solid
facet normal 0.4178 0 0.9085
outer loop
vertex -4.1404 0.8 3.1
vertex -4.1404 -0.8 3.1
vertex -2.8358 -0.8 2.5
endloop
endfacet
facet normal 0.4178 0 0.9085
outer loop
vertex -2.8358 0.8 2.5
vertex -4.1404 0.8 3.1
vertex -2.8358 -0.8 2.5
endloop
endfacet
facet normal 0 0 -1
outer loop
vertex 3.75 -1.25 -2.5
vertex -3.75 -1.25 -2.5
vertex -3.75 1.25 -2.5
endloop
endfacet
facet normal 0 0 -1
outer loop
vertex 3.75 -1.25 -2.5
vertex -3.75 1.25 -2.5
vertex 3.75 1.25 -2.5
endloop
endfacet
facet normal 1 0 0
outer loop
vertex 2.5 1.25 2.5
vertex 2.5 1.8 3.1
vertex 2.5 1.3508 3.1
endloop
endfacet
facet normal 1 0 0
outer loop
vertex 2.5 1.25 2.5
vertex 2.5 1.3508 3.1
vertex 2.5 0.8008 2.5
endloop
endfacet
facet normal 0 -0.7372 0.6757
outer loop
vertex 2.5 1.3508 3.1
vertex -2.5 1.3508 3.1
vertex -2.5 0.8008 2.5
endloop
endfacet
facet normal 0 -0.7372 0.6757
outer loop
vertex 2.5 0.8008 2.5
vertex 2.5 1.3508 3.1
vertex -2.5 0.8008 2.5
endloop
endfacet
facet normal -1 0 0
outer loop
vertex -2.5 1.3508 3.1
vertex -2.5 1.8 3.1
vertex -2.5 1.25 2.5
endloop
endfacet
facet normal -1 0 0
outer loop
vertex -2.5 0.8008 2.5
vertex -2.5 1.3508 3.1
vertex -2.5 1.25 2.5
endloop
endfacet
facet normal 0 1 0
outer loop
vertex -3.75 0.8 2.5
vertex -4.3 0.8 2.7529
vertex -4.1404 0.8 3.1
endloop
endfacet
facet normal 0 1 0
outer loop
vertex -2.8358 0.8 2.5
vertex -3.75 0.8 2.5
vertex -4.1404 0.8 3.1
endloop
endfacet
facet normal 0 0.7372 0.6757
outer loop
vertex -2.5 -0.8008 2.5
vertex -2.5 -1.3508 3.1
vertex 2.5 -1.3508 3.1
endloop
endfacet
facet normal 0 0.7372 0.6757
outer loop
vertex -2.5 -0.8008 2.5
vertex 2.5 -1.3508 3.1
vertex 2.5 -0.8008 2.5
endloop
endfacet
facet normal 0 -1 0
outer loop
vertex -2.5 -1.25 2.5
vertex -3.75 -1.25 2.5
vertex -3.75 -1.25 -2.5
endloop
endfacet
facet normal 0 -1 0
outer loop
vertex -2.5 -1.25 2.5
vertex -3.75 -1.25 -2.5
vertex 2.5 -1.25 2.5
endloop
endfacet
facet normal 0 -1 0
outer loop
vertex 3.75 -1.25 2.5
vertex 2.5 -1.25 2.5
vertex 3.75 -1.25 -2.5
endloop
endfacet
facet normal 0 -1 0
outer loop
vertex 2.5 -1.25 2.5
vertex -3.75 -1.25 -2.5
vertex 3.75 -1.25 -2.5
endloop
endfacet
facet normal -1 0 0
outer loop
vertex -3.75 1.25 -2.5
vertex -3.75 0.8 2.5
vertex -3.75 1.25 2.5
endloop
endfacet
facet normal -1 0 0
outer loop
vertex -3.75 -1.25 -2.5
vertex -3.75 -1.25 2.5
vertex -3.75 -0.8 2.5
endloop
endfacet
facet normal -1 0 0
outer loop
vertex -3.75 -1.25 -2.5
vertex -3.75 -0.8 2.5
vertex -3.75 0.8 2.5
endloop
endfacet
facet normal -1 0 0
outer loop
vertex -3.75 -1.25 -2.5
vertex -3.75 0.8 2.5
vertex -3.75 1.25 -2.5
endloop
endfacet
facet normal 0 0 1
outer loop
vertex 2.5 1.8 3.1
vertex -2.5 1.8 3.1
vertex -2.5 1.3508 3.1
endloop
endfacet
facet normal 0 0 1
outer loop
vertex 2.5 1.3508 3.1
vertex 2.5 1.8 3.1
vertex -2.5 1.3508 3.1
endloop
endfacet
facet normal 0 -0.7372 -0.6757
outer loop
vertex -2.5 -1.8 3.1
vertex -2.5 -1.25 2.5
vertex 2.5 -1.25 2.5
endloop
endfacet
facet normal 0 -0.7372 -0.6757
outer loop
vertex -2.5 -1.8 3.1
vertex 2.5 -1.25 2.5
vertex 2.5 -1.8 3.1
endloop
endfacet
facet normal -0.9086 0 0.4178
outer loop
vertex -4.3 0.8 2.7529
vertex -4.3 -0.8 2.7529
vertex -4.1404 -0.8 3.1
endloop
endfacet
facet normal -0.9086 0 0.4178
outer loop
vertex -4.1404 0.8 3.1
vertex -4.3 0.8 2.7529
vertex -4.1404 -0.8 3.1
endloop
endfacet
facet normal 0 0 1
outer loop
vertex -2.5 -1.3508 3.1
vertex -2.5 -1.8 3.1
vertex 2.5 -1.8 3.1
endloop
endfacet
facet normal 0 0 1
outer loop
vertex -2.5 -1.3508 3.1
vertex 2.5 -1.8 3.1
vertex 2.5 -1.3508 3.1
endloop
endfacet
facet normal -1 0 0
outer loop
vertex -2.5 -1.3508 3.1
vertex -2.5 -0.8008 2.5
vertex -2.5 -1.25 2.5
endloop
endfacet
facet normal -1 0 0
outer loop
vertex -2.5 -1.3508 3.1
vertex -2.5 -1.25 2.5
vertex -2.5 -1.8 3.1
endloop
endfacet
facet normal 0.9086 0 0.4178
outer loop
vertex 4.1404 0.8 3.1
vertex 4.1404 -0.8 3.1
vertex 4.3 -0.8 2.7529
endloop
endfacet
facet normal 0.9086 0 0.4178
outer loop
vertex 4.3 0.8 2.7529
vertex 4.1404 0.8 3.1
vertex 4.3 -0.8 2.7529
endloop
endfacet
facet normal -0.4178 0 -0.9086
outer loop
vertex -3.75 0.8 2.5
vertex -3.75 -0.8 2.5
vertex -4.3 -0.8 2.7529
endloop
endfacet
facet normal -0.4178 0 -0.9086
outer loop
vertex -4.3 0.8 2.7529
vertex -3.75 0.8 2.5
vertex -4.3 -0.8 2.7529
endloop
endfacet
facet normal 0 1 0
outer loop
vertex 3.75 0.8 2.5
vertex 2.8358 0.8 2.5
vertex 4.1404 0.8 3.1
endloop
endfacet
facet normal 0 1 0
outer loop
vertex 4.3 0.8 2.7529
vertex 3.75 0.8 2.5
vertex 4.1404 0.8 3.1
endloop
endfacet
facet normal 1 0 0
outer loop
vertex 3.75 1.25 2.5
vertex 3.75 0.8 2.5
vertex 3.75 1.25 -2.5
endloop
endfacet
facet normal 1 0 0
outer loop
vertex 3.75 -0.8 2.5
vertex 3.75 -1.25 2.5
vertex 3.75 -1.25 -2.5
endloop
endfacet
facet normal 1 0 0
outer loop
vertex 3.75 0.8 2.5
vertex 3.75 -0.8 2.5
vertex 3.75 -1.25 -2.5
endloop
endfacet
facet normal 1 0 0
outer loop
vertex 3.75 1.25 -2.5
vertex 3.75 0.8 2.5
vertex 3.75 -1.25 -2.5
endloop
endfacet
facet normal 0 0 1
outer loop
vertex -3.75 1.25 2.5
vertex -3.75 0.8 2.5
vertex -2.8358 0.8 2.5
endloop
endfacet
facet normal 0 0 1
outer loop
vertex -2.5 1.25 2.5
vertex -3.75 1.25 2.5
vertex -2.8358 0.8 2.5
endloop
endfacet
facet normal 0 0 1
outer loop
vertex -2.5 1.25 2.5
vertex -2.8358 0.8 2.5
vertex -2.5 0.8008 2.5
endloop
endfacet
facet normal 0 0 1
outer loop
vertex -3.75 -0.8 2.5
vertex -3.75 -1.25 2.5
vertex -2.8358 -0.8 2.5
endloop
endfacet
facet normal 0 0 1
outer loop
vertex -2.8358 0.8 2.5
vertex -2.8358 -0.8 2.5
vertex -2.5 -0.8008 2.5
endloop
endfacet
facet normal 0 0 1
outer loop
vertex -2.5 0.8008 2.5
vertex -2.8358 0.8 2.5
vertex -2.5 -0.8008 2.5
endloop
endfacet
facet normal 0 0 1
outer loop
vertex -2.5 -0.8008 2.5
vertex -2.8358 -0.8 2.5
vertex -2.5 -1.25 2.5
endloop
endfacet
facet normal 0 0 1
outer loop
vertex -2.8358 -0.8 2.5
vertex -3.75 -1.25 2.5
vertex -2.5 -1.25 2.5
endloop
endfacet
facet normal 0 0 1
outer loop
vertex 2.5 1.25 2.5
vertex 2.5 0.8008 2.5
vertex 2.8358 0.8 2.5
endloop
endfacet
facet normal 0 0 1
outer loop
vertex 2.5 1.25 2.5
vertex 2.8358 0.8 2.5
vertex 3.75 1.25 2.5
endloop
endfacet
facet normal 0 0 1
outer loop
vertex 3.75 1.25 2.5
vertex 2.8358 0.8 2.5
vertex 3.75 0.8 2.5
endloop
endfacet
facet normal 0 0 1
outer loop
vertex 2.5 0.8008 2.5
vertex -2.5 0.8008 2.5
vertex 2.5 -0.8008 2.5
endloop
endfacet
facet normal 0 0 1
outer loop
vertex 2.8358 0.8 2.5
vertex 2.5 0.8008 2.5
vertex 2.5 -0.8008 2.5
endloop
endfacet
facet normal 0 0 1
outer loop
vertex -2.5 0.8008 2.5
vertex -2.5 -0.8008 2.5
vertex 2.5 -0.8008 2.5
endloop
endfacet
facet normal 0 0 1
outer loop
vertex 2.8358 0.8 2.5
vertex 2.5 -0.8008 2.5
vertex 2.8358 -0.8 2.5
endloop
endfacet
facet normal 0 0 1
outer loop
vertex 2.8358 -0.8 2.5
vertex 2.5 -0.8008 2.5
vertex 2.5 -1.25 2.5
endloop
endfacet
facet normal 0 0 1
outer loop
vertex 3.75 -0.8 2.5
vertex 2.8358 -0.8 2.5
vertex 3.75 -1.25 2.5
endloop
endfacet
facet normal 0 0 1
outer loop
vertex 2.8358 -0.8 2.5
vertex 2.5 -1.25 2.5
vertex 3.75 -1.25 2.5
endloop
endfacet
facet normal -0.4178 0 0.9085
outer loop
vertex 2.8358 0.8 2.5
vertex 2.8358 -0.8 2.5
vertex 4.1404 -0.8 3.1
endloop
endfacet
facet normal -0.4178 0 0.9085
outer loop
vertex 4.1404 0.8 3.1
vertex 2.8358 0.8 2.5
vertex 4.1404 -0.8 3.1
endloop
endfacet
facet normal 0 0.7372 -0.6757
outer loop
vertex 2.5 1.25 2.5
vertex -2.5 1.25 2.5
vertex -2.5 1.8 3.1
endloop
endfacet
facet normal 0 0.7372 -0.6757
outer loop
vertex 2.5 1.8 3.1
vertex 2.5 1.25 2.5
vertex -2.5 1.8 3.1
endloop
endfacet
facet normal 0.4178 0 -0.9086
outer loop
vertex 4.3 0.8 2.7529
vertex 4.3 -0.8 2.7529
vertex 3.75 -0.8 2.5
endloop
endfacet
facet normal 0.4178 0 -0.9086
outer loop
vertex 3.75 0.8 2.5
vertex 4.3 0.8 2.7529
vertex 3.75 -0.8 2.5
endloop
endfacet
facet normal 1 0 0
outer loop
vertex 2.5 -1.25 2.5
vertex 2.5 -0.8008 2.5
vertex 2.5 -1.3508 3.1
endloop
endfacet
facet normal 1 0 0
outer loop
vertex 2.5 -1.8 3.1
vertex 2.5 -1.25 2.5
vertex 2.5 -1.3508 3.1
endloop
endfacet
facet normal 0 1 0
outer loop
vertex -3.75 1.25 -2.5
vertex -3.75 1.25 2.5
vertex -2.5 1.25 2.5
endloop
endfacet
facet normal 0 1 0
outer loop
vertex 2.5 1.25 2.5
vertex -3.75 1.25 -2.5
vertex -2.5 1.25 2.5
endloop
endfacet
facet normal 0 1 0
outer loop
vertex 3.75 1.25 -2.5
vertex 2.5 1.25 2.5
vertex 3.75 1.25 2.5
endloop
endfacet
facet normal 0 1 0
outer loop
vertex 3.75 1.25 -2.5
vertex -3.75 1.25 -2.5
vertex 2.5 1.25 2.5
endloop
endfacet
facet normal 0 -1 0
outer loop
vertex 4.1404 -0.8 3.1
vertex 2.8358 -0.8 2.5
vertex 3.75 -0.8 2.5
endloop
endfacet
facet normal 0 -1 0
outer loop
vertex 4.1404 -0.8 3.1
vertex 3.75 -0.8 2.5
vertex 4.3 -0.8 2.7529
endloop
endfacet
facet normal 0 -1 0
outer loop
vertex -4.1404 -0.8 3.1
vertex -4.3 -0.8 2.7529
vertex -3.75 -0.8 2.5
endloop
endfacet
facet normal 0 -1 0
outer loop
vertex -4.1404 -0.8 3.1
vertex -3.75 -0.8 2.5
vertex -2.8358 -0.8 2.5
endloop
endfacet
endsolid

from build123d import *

# Parameters (mm, degrees)
BOSS_EXTRUDE1_DEPTH      = 1.25
BOSS_EXTRUDE1_DEPTH_BACK = 1.25
SKETCH1_W                = 7.5
SKETCH1_H                = 5
BOSS_EXTRUDE2_DEPTH      = 0.8
BOSS_EXTRUDE2_DEPTH_BACK = 0.8
BOSS_EXTRUDE3_DEPTH      = 2.5
BOSS_EXTRUDE3_DEPTH_BACK = 2.5


with BuildPart() as part:
    # Sketch1 → Boss-Extrude1 (new, two sides: drawn at the far end of the back side and taken through both)
    with BuildSketch(Plane(origin=(0, 0, 0), x_dir=(1, 0, 0), z_dir=(0, 1, 0)).offset(-BOSS_EXTRUDE1_DEPTH_BACK)):
        Rectangle(SKETCH1_W, SKETCH1_H)
    extrude(amount=BOSS_EXTRUDE1_DEPTH + BOSS_EXTRUDE1_DEPTH_BACK)

    # Sketch3 → Boss-Extrude2 (add, two sides: drawn at the far end of the back side and taken through both)
    with BuildSketch(Plane(origin=(0, 0, 0), x_dir=(1, 0, 0), z_dir=(0, 1, 0)).offset(-BOSS_EXTRUDE2_DEPTH_BACK)):
        Polygon((-3.75, -2.5), (-4.3, -2.752945266), (-4.14038936, -3.1), (-2.835759292, -2.5), align=None)
        Polygon((3.75, -2.5), (2.835759292, -2.5), (4.14038936, -3.1), (4.3, -2.752945266), align=None)
    extrude(amount=BOSS_EXTRUDE2_DEPTH + BOSS_EXTRUDE2_DEPTH_BACK)

    # Sketch5 → Boss-Extrude3 (add, two sides: drawn at the far end of the back side and taken through both)
    with BuildSketch(Plane(origin=(0, 0, 0), x_dir=(0, 0, -1), z_dir=(1, 0, 0)).offset(-BOSS_EXTRUDE3_DEPTH_BACK)):
        Polygon((-2.5, 1.25), (-3.1, 1.8), (-3.1, 1.350797038), (-2.5, 0.800797038), align=None)
        Polygon((-2.5, -0.800797038), (-2.5, -1.25), (-3.1, -1.8), (-3.1, -1.350797038), align=None)
    extrude(amount=BOSS_EXTRUDE3_DEPTH + BOSS_EXTRUDE3_DEPTH_BACK)


solid = part.part
